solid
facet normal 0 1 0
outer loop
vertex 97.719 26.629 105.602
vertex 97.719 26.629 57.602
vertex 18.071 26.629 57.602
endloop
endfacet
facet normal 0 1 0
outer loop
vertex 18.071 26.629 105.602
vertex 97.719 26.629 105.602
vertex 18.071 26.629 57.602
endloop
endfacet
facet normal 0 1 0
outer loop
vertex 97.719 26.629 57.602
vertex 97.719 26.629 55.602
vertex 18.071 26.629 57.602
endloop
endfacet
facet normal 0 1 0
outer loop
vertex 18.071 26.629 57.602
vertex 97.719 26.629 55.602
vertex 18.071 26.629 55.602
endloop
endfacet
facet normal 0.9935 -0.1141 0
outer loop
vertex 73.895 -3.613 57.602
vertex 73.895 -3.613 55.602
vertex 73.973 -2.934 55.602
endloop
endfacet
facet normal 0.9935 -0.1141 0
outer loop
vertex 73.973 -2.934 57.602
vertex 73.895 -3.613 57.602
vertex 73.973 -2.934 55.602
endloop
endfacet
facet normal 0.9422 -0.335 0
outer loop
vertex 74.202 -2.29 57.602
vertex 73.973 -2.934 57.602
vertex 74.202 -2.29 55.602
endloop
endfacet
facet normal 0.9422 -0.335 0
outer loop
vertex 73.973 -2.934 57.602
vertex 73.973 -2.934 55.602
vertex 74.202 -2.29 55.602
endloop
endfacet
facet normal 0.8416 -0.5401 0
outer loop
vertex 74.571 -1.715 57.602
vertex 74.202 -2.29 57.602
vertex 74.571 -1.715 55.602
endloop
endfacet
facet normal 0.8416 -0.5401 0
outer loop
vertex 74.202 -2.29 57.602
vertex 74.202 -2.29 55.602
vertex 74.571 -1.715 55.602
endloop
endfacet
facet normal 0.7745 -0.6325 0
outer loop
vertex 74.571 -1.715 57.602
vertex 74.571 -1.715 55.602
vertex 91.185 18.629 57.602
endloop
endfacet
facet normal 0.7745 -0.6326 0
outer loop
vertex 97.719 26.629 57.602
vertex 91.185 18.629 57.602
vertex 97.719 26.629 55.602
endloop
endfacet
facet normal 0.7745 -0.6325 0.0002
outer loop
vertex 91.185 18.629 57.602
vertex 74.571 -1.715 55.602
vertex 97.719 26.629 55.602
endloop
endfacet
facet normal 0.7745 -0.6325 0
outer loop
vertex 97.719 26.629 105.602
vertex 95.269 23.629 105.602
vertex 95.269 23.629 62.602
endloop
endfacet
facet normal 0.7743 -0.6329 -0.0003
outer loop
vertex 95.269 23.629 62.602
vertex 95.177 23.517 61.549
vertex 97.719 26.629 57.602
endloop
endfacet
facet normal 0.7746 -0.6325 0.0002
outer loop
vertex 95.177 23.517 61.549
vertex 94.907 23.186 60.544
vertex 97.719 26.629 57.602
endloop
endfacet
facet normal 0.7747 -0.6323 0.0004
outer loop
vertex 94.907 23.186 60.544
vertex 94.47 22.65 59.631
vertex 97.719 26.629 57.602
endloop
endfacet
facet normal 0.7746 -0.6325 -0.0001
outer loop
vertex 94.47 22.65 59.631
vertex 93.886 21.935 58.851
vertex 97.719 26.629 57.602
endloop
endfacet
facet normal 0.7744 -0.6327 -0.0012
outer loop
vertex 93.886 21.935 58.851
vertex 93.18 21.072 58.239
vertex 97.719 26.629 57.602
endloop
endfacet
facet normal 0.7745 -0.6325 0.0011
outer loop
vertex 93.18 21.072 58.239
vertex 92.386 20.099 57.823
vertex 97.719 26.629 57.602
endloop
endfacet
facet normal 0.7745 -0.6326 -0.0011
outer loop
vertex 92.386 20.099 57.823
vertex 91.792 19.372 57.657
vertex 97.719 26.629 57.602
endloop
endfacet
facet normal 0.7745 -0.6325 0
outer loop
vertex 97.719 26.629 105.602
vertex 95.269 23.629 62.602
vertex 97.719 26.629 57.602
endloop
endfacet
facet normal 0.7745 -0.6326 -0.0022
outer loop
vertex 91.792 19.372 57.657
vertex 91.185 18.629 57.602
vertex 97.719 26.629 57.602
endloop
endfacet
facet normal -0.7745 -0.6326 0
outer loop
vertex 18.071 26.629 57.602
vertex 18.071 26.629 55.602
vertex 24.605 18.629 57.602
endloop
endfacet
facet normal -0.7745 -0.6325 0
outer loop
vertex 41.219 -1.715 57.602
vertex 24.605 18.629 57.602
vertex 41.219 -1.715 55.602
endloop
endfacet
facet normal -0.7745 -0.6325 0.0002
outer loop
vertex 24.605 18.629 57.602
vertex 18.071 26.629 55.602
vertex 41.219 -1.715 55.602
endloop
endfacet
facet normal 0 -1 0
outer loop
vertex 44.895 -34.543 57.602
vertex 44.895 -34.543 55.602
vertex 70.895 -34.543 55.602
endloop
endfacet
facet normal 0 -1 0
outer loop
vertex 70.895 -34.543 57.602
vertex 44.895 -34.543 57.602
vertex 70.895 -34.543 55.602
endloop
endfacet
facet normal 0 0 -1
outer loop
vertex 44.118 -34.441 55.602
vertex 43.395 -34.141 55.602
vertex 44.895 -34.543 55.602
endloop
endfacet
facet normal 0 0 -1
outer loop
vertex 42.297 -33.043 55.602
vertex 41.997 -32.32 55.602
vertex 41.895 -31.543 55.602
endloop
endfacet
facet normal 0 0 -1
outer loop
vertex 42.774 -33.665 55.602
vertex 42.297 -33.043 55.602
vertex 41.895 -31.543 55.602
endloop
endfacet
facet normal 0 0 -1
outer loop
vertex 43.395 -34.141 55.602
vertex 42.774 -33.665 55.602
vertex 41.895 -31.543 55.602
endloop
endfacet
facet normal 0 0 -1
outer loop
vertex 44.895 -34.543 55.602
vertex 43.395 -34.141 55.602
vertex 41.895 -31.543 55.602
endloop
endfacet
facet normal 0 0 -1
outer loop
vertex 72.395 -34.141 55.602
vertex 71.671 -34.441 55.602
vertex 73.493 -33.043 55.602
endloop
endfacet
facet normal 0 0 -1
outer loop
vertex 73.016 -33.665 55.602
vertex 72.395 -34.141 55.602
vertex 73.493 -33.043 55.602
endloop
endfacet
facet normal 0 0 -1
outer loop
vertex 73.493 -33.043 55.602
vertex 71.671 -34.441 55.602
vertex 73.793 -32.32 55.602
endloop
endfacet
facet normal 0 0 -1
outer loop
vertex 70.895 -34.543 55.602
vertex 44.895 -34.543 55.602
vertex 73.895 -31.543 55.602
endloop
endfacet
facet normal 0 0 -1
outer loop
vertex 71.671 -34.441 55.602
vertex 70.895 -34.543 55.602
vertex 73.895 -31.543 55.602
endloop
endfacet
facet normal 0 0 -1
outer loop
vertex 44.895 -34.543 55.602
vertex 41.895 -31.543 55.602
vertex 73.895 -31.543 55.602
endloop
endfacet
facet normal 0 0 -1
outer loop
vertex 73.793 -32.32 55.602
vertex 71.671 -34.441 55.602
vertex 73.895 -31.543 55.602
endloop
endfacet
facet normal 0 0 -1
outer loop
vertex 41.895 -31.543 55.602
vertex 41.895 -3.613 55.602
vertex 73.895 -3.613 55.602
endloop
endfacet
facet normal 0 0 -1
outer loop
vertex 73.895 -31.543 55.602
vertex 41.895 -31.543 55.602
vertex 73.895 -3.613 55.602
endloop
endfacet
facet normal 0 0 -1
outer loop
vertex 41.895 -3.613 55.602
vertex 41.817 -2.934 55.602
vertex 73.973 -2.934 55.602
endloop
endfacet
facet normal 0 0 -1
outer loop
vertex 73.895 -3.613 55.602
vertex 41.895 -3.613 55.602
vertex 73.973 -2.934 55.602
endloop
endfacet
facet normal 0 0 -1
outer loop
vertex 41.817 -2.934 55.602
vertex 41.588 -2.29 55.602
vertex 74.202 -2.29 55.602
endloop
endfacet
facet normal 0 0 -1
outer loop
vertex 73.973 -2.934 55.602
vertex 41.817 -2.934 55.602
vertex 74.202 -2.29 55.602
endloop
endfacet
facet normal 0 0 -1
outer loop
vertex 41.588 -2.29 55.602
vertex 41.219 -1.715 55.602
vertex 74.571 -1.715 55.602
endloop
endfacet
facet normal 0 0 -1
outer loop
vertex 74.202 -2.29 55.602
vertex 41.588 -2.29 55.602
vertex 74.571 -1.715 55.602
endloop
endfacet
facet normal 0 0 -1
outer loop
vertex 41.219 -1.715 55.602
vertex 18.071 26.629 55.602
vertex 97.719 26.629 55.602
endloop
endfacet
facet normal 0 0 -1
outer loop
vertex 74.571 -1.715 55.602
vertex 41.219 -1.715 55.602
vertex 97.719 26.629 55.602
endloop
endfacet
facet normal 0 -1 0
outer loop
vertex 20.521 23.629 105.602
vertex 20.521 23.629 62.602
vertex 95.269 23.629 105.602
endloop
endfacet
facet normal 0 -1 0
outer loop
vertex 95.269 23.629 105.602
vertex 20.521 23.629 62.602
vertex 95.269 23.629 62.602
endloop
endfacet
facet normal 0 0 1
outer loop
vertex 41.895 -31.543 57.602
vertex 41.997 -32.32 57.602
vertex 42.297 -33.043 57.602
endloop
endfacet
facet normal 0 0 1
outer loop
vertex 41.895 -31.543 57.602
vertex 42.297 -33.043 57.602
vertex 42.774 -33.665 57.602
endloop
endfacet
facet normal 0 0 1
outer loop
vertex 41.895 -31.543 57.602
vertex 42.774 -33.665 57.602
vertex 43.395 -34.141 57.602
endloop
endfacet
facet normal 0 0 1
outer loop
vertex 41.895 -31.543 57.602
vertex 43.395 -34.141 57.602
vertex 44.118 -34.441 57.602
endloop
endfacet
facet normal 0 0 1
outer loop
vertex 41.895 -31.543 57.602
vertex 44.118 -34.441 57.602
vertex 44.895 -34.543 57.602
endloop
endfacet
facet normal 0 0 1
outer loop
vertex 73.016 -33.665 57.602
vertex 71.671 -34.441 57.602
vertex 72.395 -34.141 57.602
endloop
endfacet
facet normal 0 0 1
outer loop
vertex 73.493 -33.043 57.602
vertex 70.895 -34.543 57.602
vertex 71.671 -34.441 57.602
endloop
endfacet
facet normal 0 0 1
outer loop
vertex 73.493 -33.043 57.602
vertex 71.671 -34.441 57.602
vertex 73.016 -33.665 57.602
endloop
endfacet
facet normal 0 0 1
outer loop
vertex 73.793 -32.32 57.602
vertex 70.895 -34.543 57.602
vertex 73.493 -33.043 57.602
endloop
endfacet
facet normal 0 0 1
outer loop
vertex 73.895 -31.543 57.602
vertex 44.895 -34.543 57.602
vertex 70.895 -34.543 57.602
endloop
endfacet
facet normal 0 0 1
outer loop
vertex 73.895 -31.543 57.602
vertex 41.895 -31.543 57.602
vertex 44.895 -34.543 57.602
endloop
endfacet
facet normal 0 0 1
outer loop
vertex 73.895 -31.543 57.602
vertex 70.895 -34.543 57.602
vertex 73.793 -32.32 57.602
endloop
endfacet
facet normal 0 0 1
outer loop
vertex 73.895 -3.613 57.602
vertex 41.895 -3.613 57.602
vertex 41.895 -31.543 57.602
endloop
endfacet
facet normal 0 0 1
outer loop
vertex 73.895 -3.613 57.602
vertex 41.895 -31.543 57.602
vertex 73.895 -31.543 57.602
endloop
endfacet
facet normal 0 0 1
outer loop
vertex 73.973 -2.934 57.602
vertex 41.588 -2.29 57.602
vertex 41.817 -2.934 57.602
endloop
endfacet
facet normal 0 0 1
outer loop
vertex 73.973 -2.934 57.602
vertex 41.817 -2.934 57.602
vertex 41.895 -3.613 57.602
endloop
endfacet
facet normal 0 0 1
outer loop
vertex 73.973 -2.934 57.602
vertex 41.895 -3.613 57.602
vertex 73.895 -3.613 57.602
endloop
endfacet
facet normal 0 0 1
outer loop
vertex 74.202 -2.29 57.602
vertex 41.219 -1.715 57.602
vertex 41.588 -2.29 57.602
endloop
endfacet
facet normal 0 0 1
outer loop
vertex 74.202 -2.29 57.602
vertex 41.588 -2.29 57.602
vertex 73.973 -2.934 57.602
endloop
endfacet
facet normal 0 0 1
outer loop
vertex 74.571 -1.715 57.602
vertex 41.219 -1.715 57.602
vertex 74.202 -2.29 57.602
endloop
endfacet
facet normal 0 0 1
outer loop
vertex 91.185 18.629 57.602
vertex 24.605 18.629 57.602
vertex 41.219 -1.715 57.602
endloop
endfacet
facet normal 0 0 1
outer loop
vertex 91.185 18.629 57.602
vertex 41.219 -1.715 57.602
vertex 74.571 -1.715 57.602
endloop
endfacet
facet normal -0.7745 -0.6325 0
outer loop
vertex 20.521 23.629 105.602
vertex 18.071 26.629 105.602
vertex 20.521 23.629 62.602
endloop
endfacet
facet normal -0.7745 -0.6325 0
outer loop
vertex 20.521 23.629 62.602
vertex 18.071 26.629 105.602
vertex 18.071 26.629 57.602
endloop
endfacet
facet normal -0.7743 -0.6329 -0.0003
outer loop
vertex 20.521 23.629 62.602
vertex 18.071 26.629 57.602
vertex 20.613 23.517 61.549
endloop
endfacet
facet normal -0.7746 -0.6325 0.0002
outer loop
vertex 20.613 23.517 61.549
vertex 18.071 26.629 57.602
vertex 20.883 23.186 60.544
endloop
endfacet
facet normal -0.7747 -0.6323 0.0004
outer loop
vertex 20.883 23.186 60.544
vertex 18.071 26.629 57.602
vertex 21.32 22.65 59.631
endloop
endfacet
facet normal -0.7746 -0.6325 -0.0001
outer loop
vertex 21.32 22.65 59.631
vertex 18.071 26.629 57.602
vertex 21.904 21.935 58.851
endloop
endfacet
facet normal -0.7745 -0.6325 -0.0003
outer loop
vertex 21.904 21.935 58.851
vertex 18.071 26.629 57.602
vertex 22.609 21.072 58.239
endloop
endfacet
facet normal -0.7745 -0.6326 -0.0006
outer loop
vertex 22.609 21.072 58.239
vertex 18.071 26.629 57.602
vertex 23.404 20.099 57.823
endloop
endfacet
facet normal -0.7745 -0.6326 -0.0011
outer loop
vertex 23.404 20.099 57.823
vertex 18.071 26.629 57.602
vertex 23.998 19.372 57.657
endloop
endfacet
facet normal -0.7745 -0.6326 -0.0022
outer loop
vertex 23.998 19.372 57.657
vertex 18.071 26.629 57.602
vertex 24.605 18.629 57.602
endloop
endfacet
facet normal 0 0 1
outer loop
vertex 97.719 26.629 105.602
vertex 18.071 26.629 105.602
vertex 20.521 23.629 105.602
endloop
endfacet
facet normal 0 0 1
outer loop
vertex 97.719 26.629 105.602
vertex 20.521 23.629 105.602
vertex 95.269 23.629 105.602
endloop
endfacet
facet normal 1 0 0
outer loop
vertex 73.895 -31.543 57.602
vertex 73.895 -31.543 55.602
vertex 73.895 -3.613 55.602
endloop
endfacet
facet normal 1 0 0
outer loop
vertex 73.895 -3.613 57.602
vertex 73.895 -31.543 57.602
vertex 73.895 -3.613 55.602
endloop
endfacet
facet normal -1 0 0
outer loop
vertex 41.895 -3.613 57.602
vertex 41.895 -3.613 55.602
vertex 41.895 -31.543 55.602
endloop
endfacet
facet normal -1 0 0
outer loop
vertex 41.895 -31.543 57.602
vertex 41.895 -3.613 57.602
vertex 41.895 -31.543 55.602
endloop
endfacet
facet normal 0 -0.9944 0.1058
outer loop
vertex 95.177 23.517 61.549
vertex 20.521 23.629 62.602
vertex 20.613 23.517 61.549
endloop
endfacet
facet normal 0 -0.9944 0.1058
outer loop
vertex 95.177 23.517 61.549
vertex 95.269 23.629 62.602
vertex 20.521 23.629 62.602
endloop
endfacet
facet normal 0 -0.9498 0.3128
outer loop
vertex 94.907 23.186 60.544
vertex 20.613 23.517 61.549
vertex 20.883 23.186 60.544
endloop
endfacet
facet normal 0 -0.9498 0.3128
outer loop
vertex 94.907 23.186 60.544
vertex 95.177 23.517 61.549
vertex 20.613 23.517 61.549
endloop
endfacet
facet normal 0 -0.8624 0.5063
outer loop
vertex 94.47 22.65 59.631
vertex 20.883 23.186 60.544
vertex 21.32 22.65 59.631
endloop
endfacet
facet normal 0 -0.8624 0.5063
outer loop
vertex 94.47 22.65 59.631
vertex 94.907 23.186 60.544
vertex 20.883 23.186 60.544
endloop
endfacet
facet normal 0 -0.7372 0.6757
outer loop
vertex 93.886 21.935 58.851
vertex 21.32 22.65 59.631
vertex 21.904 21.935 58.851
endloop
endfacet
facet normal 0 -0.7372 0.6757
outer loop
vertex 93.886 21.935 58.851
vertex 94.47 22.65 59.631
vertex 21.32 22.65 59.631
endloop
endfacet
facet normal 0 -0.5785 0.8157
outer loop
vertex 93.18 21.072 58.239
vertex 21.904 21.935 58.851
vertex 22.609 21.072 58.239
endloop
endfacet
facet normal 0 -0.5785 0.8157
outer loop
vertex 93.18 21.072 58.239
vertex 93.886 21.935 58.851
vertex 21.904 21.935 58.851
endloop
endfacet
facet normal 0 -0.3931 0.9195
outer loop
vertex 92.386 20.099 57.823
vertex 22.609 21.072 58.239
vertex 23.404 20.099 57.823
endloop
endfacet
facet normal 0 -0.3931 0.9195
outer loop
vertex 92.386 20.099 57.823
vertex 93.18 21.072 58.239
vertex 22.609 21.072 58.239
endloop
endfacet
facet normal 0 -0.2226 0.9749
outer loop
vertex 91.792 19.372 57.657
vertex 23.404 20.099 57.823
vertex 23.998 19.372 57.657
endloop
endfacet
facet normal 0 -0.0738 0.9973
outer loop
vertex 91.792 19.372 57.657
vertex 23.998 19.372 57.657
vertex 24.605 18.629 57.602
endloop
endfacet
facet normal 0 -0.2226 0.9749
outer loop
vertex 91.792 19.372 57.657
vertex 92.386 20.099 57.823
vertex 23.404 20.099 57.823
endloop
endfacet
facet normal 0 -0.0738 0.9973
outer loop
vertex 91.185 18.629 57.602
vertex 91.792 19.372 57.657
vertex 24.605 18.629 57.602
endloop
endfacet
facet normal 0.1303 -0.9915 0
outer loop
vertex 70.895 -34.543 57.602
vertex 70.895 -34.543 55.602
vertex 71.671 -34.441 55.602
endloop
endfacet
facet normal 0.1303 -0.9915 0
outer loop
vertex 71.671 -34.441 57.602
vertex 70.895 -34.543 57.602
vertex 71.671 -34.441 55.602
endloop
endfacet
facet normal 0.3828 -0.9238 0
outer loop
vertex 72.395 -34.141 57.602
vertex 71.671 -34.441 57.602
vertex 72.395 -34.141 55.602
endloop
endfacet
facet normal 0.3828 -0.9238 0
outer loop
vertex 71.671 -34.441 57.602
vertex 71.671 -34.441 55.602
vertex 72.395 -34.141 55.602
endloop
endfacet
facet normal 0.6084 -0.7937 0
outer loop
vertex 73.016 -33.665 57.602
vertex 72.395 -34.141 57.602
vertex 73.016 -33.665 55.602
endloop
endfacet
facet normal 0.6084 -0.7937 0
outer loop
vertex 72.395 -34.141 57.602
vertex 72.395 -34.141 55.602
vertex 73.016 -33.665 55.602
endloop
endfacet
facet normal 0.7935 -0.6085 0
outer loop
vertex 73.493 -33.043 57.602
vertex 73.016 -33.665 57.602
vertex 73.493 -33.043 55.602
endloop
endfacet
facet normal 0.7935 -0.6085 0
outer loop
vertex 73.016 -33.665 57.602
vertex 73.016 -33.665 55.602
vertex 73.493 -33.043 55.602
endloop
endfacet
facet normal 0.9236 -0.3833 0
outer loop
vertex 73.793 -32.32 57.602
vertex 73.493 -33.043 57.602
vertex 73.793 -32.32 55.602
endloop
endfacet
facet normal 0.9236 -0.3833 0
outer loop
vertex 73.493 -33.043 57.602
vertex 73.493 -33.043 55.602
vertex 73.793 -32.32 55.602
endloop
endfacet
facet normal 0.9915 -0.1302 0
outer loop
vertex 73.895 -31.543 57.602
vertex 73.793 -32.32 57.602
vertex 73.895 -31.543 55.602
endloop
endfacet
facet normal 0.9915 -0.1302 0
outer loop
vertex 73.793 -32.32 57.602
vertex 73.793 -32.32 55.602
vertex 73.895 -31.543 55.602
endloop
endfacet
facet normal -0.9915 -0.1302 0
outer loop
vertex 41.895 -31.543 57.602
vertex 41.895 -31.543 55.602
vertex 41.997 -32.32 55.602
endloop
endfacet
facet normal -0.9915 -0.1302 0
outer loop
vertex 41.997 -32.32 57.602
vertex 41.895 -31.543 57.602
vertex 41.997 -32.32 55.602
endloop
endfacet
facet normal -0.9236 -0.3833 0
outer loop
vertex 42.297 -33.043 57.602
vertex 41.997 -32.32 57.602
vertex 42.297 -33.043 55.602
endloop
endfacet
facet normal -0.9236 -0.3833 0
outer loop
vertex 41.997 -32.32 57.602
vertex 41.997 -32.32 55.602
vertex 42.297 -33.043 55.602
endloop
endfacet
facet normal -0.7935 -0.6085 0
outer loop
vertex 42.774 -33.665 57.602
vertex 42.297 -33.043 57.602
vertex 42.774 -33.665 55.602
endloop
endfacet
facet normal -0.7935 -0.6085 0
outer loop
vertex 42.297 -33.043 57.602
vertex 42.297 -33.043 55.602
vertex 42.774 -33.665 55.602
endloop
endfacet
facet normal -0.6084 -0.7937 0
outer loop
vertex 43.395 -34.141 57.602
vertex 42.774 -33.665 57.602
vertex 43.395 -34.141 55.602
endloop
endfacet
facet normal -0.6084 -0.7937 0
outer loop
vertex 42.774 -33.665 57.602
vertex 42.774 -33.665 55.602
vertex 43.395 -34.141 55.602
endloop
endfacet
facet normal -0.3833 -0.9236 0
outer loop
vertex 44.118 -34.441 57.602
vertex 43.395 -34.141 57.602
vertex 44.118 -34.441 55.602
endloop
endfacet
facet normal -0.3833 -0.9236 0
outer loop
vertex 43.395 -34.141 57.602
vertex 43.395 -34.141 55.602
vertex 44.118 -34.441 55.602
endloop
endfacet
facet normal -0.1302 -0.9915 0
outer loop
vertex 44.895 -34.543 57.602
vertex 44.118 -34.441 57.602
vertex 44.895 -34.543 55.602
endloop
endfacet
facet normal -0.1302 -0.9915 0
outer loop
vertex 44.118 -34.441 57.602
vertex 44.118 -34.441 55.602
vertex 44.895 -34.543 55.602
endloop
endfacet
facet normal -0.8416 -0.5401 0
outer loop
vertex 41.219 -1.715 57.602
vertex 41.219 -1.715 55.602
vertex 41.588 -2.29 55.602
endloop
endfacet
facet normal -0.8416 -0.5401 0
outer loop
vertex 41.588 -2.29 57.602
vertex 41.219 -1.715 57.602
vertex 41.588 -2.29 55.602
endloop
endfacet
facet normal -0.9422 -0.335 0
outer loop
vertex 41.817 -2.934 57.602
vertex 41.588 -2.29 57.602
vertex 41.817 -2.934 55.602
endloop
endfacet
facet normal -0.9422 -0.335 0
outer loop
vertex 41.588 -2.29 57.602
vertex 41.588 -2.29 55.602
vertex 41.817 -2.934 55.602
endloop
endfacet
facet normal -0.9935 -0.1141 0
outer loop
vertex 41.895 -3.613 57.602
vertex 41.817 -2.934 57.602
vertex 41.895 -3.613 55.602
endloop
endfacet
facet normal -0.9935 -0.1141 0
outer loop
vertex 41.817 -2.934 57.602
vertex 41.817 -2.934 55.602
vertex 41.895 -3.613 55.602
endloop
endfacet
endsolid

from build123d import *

# Parameters (mm, degrees)
SIDE_EXTRUDE_DEPTH         = 2
TOP_EXTRUDE_DEPTH          = 48
FILLET_BETWEEN_SIDES_5MM_R = 5


with BuildPart() as part:
    # Sketch1 → Side extrude (new body)
    with BuildSketch(Plane.XY.offset(55.601550083)):
        with BuildLine():
            Line((93.845211173, 26.628512047), (21.944630571, 26.628512047))
            Line((21.944630571, 26.628512047), (18.071324489, 26.628512047))
            Line((18.071324489, 26.628512047), (41.218517255, -1.714989299))
            ThreePointArc((41.218517255, -1.714989299), (41.720764918, -2.60531677), (41.894920872, -3.612593011))
            Line((41.894920872, -3.612593011), (41.894920872, -31.543238626))
            ThreePointArc((41.894920872, -31.543238626), (42.773600528, -33.66455897), (44.894920872, -34.543238626))
            Line((44.894920872, -34.543238626), (70.894920872, -34.543238626))
            ThreePointArc((70.894920872, -34.543238626), (73.016241216, -33.66455897), (73.894920872, -31.543238626))
            Line((73.894920872, -31.543238626), (73.894920872, -3.612593011))
            ThreePointArc((73.894920872, -3.612593011), (74.069076826, -2.60531677), (74.571324489, -1.714989299))
            Line((74.571324489, -1.714989299), (97.718517255, 26.628512047))
            Line((97.718517255, 26.628512047), (93.845211173, 26.628512047))
        make_face()
    extrude(amount=SIDE_EXTRUDE_DEPTH)

    # Sketch2 → Top extrude (add)
    with BuildSketch(Plane.XY.offset(57.601550083)):
        Polygon((97.718517255, 26.628512047), (18.071324489, 26.628512047), (20.521324489, 23.628512047), (95.268517255, 23.628512047), align=None)
    extrude(amount=TOP_EXTRUDE_DEPTH)

    # Fillet between sides 5mm
    fillet_between_sides_5mm_edges = [part.edges().sort_by_distance(p)[0] for p in [
        (57.894920872, 23.628512047, 57.601550083),
    ]]
    fillet(fillet_between_sides_5mm_edges, radius=FILLET_BETWEEN_SIDES_5MM_R)


solid = part.part
